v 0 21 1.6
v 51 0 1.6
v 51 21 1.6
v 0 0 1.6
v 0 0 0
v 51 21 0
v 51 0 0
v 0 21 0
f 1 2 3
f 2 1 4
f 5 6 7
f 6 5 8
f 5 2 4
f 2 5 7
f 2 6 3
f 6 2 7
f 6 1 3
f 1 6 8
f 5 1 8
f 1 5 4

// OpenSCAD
$fn = 64;

board_x = 51.0;
board_y = 21.0;
board_z = 1.6;

color([0.05, 0.45, 0.12])
cube([board_x, board_y, board_z], center=false);
